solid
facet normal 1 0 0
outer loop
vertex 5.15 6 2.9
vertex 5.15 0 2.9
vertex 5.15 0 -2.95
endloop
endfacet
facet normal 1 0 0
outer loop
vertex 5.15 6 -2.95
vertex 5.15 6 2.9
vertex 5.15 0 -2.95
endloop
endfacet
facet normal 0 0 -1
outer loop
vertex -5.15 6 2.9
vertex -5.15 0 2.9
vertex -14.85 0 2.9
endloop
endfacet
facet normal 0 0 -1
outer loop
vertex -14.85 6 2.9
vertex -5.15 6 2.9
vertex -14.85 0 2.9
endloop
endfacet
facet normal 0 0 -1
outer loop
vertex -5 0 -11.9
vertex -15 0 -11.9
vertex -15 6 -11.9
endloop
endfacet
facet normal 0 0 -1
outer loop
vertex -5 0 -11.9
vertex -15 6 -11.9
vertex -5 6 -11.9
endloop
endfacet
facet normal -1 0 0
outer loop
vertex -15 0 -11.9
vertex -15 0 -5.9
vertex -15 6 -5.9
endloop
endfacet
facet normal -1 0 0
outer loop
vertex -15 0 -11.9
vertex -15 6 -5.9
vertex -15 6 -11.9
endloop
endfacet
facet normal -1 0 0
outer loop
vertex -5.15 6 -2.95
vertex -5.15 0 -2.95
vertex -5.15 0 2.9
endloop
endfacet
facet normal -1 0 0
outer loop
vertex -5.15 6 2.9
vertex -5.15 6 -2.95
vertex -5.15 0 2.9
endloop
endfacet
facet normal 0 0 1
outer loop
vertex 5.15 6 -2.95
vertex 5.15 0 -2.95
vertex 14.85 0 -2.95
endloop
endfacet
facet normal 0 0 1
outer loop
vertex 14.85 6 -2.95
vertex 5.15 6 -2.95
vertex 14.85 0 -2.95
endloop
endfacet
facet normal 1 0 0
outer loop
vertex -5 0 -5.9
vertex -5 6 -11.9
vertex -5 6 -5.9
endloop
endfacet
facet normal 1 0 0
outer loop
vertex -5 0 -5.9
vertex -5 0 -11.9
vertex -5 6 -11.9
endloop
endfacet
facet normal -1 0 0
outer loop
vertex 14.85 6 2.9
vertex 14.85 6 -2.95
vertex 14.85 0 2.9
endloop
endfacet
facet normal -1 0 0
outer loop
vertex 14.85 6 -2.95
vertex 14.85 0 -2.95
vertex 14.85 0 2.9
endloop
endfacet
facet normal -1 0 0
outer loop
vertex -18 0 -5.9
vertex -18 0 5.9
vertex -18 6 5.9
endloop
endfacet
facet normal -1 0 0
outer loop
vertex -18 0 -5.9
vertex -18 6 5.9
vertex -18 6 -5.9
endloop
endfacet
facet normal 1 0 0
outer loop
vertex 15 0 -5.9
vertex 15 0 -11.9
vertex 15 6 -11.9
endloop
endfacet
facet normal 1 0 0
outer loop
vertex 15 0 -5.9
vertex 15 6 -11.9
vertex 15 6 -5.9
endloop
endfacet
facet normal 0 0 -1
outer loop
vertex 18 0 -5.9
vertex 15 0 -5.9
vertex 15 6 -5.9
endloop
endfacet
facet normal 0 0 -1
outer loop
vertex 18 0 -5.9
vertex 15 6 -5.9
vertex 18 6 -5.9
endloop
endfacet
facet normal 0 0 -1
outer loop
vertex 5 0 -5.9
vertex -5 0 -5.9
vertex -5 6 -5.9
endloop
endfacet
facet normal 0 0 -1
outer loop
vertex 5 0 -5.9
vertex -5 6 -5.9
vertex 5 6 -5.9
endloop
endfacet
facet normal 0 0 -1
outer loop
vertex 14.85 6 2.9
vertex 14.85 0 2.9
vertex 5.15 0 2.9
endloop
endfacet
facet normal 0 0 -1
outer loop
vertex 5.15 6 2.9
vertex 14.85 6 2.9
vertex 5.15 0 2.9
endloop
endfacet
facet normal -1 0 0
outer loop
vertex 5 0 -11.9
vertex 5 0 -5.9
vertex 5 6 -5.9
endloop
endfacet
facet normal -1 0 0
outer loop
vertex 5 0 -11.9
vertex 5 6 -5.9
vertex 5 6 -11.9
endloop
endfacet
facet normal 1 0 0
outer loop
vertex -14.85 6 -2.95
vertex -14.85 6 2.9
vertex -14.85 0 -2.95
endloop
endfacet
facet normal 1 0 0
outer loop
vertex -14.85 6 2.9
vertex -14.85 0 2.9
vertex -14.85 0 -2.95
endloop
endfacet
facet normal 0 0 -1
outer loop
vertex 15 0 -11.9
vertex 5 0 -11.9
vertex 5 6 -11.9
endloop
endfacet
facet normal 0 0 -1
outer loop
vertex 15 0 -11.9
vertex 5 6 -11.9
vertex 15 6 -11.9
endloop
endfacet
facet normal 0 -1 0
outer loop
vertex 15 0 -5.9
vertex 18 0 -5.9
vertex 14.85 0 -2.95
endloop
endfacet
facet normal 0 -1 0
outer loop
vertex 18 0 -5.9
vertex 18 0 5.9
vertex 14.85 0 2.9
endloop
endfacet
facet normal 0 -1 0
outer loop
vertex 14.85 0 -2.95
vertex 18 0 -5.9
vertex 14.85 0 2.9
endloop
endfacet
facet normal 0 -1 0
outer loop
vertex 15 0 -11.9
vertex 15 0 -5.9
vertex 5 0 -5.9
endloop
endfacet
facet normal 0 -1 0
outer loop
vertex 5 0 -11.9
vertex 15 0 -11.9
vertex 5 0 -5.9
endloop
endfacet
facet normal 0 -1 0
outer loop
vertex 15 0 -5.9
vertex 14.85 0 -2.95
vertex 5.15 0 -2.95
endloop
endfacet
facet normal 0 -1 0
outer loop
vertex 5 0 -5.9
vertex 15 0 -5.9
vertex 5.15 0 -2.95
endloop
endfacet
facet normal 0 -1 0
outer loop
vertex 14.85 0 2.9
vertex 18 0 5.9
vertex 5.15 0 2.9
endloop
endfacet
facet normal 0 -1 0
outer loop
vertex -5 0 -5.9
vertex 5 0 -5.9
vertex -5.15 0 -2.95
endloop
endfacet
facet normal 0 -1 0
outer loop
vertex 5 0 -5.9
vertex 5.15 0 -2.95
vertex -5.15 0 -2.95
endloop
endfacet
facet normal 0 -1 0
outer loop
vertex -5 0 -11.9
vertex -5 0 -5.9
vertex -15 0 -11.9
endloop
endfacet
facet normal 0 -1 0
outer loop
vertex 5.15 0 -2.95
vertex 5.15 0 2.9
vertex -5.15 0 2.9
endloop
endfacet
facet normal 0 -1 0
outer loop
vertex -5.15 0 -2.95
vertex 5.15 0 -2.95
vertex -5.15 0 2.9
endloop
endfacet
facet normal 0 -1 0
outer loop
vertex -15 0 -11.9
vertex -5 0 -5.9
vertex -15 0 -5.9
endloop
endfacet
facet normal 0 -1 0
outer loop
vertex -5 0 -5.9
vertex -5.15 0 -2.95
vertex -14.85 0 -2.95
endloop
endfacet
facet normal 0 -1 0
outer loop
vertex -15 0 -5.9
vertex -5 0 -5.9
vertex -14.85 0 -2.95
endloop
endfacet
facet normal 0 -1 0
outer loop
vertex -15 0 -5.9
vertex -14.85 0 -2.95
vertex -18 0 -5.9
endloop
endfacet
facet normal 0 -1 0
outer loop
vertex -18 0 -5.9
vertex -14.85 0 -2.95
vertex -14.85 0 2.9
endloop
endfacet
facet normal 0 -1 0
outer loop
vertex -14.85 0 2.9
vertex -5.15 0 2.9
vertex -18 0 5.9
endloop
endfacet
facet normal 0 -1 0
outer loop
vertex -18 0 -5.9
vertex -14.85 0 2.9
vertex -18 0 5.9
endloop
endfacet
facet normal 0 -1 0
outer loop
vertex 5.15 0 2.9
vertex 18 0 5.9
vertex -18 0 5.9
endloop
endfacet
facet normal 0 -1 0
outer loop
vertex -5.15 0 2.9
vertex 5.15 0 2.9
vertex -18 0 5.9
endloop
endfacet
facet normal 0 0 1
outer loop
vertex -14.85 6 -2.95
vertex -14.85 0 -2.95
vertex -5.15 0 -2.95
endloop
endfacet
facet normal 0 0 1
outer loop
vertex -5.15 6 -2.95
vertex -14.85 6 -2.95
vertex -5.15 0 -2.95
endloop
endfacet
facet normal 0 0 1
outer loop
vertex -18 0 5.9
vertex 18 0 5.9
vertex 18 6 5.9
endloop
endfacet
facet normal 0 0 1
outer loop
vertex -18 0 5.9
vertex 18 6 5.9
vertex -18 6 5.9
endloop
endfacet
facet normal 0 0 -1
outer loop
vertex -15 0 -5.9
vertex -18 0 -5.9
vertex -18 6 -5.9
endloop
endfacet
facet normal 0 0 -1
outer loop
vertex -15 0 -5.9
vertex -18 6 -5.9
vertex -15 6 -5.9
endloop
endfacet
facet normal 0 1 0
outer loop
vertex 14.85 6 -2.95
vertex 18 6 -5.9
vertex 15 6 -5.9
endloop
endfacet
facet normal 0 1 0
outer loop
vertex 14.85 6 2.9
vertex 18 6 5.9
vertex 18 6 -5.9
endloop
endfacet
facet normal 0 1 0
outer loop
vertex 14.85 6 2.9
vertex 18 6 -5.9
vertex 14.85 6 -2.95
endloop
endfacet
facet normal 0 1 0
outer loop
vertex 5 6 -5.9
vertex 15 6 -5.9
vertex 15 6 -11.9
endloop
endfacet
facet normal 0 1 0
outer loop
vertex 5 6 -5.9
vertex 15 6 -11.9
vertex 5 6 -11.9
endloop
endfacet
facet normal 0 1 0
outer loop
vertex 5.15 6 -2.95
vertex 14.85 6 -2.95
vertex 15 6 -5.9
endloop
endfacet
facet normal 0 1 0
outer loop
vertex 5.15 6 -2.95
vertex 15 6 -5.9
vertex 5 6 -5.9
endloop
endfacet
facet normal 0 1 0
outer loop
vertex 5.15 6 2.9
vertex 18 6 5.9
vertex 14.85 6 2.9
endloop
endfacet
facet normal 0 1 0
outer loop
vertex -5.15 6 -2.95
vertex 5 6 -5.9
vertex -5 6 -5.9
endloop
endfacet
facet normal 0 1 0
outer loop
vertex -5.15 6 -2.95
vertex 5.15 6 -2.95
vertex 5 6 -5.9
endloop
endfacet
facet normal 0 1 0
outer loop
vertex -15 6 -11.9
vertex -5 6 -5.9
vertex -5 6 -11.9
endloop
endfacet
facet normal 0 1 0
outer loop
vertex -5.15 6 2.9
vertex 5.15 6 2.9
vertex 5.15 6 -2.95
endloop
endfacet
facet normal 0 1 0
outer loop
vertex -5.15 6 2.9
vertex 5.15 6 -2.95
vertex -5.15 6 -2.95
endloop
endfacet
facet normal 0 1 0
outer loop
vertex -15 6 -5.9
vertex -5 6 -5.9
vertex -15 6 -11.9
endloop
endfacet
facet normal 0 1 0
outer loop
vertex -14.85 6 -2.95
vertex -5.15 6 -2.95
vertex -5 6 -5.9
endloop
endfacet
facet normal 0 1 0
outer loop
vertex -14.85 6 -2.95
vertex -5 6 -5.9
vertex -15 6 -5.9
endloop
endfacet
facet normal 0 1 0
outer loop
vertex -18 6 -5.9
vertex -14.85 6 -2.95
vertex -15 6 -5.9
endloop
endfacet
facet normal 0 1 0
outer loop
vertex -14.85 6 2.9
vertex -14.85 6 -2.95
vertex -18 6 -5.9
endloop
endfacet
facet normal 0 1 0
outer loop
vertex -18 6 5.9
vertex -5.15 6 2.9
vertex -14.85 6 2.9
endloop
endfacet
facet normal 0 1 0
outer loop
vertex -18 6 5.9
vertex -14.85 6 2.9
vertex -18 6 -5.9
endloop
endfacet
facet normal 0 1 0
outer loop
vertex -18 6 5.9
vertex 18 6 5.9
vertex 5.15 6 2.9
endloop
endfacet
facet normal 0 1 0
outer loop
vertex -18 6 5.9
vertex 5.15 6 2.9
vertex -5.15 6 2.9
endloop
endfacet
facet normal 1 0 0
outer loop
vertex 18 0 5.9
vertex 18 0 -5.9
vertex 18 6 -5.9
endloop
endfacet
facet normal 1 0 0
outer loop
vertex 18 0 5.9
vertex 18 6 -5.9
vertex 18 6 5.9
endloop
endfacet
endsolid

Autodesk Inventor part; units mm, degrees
ref_plane "YZ Plane" through (0, 0, 0) normal (1, 0, 0) x (0, 1, 0)
ref_plane "XZ Plane" through (0, 0, 0) normal (0, 1, 0) x (-1, 0, 0)
ref_plane "XY Plane" through (0, 0, 0) normal (0, 0, 1) x (1, 0, 0)
sketch "Sketch1" plane through (0, 0, 0) normal (0, 1, 0) x (-1, 0, 0)
  line L0 (-18, -5.8998) -> (-18, 5.8998)
  line L1 (-18, 5.8998) -> (18, 5.8998)
  line L2 (18, 5.8998) -> (18, -5.8998)
  line L3 (15, -11.8998) -> (5, -11.8998)
  line L4 (5, -11.8998) -> (5, -5.8998)
  line L5 (15, -5.8998) -> (15, -11.8998)
  line L6 (18, -5.8998) -> (15, -5.8998)
  line L7 (5, -5.8998) -> (-18, -5.8998) construction
  line L8 (-5, -11.8998) -> (-15, -11.8998)
  line L9 (-15, -11.8998) -> (-15, -5.8998)
  line L10 (-5, -5.8998) -> (-5, -11.8998)
  line L11 (5, -5.8998) -> (-5, -5.8998)
  line L12 (-15, -5.8998) -> (-18, -5.8998)
  line L13 (14.85, -2.9502) -> (5.15, -2.9502)
  line L14 (5.15, -2.9502) -> (5.15, 2.8998)
  line L15 (5.15, 2.8998) -> (14.85, 2.8998)
  line L16 (14.85, 2.8998) -> (14.85, -2.9502)
  line L17 (-5.15, 2.8998) -> (-5.15, -2.9502)
  line L18 (-5.15, -2.9502) -> (-14.85, -2.9502)
  line L19 (-14.85, -2.9502) -> (-14.85, 2.8998)
  line L20 (-14.85, 2.8998) -> (-5.15, 2.8998)
  line L21 (5.15, 2.8998) -> (-5.15, 2.8998) construction
  point P0 (0, 0)
  point P1 (18, 0)
  point P2 (0, -5.8998)
  point P3 (0, 5.8998)
  point P4 (0, 2.8998)
  dimension "d9" = 10
  dimension "d11" = 6
  dimension "d12" = 3
  dimension "d38" = 20
  dimension "d51" = 3
  dimension "d54" = 9.7
  dimension "d55" = 5.85
  dimension "d58" = 20
  dimension "d64" = 3
extrude "Extrusion1" add sketch "Sketch1" along normal blind 6
equation "\"d9\" = fingerW"
equation "\"d11\" = fingerH"
equation "\"d38\" = fingerSpacing"
equation "\"d54\" = fingerholeW"
equation "\"d55\" = fingerholeH"
equation "\"d58\" = fingerSpacing"
equation "\"d65\" = thickness"
equation "\"moduleWidth\" = 118"
equation "\"moduleHeight\" = 96"
equation "\"moduleMountD\" = 6.8"
equation "\"moduleCornerR\" = 5"
equation "\"d4\" = moduleCornerR"
equation "\"d5\" = moduleMountD"
equation "\"d6\" = moduleMountD"
equation "\"d8\" = moduleMountD"
equation "\"d10\" = moduleMountD"
equation "\"moduleOpeningR\" = 25"
equation "\"d13\" = moduleOpeningR"
equation "\"thickness\" = 6"
equation "\"d15\" = thickness"
equation "\"d16\" = 0"
equation "\"kerf\" = 0.15"
equation "\"fingerW\" = 10"
equation "\"fingerSpacing\" = 20"
equation "\"fingerholeW\" = fingerW - 2 * kerf"
equation "\"fingerholeH\" = thickness - kerf"
equation "\"moduleMountClearance\" = 19"
equation "\"actuatorW\" = 28"
equation "\"actuatorH\" = 40.8"
equation "\"openingMFC\" = 45"
equation "\"d28\" = thickness"
equation "\"d29\" = thickness"
equation "\"d30\" = 0.5 * actuatorH + thickness"
equation "\"d32\" = fingerholeH"
equation "\"d33\" = fingerholeW"
equation "\"d41\" = fingerholeH"
equation "\"d42\" = fingerholeW"
equation "\"supportSpacingFromMounting\" = 15"
equation "\"d52\" = 58.075"
equation "\"d53\" = 9.475"
equation "\"d0\" = moduleHeight"
equation "\"d1\" = moduleWidth"
equation "\"d17\" = openingMFC"
equation "\"d19\" = moduleMountClearance"
equation "\"d31\" = 15"
equation "\"supportXW\" = -2 * thickness + moduleMountW - 2 * supportSpacingFromMounting + kerf"
equation "\"chairThickness\" = 12.7"
equation "\"supportL\" = -chairThickness + dildoL + actuatorMountL - thickness"
equation "\"fingerH\" = thickness"
equation "\"d18\" = fingerH"
equation "\"d24\" = supportL"
equation "\"d44\" = thickness"
equation "\"d47\" = 0"
equation "\"moduleMountW\" = 100"
equation "\"dildoL\" = 170"
equation "\"actuatorMountL\" = 190"
properties part number "6mm-Laser-Kerf-Test"
